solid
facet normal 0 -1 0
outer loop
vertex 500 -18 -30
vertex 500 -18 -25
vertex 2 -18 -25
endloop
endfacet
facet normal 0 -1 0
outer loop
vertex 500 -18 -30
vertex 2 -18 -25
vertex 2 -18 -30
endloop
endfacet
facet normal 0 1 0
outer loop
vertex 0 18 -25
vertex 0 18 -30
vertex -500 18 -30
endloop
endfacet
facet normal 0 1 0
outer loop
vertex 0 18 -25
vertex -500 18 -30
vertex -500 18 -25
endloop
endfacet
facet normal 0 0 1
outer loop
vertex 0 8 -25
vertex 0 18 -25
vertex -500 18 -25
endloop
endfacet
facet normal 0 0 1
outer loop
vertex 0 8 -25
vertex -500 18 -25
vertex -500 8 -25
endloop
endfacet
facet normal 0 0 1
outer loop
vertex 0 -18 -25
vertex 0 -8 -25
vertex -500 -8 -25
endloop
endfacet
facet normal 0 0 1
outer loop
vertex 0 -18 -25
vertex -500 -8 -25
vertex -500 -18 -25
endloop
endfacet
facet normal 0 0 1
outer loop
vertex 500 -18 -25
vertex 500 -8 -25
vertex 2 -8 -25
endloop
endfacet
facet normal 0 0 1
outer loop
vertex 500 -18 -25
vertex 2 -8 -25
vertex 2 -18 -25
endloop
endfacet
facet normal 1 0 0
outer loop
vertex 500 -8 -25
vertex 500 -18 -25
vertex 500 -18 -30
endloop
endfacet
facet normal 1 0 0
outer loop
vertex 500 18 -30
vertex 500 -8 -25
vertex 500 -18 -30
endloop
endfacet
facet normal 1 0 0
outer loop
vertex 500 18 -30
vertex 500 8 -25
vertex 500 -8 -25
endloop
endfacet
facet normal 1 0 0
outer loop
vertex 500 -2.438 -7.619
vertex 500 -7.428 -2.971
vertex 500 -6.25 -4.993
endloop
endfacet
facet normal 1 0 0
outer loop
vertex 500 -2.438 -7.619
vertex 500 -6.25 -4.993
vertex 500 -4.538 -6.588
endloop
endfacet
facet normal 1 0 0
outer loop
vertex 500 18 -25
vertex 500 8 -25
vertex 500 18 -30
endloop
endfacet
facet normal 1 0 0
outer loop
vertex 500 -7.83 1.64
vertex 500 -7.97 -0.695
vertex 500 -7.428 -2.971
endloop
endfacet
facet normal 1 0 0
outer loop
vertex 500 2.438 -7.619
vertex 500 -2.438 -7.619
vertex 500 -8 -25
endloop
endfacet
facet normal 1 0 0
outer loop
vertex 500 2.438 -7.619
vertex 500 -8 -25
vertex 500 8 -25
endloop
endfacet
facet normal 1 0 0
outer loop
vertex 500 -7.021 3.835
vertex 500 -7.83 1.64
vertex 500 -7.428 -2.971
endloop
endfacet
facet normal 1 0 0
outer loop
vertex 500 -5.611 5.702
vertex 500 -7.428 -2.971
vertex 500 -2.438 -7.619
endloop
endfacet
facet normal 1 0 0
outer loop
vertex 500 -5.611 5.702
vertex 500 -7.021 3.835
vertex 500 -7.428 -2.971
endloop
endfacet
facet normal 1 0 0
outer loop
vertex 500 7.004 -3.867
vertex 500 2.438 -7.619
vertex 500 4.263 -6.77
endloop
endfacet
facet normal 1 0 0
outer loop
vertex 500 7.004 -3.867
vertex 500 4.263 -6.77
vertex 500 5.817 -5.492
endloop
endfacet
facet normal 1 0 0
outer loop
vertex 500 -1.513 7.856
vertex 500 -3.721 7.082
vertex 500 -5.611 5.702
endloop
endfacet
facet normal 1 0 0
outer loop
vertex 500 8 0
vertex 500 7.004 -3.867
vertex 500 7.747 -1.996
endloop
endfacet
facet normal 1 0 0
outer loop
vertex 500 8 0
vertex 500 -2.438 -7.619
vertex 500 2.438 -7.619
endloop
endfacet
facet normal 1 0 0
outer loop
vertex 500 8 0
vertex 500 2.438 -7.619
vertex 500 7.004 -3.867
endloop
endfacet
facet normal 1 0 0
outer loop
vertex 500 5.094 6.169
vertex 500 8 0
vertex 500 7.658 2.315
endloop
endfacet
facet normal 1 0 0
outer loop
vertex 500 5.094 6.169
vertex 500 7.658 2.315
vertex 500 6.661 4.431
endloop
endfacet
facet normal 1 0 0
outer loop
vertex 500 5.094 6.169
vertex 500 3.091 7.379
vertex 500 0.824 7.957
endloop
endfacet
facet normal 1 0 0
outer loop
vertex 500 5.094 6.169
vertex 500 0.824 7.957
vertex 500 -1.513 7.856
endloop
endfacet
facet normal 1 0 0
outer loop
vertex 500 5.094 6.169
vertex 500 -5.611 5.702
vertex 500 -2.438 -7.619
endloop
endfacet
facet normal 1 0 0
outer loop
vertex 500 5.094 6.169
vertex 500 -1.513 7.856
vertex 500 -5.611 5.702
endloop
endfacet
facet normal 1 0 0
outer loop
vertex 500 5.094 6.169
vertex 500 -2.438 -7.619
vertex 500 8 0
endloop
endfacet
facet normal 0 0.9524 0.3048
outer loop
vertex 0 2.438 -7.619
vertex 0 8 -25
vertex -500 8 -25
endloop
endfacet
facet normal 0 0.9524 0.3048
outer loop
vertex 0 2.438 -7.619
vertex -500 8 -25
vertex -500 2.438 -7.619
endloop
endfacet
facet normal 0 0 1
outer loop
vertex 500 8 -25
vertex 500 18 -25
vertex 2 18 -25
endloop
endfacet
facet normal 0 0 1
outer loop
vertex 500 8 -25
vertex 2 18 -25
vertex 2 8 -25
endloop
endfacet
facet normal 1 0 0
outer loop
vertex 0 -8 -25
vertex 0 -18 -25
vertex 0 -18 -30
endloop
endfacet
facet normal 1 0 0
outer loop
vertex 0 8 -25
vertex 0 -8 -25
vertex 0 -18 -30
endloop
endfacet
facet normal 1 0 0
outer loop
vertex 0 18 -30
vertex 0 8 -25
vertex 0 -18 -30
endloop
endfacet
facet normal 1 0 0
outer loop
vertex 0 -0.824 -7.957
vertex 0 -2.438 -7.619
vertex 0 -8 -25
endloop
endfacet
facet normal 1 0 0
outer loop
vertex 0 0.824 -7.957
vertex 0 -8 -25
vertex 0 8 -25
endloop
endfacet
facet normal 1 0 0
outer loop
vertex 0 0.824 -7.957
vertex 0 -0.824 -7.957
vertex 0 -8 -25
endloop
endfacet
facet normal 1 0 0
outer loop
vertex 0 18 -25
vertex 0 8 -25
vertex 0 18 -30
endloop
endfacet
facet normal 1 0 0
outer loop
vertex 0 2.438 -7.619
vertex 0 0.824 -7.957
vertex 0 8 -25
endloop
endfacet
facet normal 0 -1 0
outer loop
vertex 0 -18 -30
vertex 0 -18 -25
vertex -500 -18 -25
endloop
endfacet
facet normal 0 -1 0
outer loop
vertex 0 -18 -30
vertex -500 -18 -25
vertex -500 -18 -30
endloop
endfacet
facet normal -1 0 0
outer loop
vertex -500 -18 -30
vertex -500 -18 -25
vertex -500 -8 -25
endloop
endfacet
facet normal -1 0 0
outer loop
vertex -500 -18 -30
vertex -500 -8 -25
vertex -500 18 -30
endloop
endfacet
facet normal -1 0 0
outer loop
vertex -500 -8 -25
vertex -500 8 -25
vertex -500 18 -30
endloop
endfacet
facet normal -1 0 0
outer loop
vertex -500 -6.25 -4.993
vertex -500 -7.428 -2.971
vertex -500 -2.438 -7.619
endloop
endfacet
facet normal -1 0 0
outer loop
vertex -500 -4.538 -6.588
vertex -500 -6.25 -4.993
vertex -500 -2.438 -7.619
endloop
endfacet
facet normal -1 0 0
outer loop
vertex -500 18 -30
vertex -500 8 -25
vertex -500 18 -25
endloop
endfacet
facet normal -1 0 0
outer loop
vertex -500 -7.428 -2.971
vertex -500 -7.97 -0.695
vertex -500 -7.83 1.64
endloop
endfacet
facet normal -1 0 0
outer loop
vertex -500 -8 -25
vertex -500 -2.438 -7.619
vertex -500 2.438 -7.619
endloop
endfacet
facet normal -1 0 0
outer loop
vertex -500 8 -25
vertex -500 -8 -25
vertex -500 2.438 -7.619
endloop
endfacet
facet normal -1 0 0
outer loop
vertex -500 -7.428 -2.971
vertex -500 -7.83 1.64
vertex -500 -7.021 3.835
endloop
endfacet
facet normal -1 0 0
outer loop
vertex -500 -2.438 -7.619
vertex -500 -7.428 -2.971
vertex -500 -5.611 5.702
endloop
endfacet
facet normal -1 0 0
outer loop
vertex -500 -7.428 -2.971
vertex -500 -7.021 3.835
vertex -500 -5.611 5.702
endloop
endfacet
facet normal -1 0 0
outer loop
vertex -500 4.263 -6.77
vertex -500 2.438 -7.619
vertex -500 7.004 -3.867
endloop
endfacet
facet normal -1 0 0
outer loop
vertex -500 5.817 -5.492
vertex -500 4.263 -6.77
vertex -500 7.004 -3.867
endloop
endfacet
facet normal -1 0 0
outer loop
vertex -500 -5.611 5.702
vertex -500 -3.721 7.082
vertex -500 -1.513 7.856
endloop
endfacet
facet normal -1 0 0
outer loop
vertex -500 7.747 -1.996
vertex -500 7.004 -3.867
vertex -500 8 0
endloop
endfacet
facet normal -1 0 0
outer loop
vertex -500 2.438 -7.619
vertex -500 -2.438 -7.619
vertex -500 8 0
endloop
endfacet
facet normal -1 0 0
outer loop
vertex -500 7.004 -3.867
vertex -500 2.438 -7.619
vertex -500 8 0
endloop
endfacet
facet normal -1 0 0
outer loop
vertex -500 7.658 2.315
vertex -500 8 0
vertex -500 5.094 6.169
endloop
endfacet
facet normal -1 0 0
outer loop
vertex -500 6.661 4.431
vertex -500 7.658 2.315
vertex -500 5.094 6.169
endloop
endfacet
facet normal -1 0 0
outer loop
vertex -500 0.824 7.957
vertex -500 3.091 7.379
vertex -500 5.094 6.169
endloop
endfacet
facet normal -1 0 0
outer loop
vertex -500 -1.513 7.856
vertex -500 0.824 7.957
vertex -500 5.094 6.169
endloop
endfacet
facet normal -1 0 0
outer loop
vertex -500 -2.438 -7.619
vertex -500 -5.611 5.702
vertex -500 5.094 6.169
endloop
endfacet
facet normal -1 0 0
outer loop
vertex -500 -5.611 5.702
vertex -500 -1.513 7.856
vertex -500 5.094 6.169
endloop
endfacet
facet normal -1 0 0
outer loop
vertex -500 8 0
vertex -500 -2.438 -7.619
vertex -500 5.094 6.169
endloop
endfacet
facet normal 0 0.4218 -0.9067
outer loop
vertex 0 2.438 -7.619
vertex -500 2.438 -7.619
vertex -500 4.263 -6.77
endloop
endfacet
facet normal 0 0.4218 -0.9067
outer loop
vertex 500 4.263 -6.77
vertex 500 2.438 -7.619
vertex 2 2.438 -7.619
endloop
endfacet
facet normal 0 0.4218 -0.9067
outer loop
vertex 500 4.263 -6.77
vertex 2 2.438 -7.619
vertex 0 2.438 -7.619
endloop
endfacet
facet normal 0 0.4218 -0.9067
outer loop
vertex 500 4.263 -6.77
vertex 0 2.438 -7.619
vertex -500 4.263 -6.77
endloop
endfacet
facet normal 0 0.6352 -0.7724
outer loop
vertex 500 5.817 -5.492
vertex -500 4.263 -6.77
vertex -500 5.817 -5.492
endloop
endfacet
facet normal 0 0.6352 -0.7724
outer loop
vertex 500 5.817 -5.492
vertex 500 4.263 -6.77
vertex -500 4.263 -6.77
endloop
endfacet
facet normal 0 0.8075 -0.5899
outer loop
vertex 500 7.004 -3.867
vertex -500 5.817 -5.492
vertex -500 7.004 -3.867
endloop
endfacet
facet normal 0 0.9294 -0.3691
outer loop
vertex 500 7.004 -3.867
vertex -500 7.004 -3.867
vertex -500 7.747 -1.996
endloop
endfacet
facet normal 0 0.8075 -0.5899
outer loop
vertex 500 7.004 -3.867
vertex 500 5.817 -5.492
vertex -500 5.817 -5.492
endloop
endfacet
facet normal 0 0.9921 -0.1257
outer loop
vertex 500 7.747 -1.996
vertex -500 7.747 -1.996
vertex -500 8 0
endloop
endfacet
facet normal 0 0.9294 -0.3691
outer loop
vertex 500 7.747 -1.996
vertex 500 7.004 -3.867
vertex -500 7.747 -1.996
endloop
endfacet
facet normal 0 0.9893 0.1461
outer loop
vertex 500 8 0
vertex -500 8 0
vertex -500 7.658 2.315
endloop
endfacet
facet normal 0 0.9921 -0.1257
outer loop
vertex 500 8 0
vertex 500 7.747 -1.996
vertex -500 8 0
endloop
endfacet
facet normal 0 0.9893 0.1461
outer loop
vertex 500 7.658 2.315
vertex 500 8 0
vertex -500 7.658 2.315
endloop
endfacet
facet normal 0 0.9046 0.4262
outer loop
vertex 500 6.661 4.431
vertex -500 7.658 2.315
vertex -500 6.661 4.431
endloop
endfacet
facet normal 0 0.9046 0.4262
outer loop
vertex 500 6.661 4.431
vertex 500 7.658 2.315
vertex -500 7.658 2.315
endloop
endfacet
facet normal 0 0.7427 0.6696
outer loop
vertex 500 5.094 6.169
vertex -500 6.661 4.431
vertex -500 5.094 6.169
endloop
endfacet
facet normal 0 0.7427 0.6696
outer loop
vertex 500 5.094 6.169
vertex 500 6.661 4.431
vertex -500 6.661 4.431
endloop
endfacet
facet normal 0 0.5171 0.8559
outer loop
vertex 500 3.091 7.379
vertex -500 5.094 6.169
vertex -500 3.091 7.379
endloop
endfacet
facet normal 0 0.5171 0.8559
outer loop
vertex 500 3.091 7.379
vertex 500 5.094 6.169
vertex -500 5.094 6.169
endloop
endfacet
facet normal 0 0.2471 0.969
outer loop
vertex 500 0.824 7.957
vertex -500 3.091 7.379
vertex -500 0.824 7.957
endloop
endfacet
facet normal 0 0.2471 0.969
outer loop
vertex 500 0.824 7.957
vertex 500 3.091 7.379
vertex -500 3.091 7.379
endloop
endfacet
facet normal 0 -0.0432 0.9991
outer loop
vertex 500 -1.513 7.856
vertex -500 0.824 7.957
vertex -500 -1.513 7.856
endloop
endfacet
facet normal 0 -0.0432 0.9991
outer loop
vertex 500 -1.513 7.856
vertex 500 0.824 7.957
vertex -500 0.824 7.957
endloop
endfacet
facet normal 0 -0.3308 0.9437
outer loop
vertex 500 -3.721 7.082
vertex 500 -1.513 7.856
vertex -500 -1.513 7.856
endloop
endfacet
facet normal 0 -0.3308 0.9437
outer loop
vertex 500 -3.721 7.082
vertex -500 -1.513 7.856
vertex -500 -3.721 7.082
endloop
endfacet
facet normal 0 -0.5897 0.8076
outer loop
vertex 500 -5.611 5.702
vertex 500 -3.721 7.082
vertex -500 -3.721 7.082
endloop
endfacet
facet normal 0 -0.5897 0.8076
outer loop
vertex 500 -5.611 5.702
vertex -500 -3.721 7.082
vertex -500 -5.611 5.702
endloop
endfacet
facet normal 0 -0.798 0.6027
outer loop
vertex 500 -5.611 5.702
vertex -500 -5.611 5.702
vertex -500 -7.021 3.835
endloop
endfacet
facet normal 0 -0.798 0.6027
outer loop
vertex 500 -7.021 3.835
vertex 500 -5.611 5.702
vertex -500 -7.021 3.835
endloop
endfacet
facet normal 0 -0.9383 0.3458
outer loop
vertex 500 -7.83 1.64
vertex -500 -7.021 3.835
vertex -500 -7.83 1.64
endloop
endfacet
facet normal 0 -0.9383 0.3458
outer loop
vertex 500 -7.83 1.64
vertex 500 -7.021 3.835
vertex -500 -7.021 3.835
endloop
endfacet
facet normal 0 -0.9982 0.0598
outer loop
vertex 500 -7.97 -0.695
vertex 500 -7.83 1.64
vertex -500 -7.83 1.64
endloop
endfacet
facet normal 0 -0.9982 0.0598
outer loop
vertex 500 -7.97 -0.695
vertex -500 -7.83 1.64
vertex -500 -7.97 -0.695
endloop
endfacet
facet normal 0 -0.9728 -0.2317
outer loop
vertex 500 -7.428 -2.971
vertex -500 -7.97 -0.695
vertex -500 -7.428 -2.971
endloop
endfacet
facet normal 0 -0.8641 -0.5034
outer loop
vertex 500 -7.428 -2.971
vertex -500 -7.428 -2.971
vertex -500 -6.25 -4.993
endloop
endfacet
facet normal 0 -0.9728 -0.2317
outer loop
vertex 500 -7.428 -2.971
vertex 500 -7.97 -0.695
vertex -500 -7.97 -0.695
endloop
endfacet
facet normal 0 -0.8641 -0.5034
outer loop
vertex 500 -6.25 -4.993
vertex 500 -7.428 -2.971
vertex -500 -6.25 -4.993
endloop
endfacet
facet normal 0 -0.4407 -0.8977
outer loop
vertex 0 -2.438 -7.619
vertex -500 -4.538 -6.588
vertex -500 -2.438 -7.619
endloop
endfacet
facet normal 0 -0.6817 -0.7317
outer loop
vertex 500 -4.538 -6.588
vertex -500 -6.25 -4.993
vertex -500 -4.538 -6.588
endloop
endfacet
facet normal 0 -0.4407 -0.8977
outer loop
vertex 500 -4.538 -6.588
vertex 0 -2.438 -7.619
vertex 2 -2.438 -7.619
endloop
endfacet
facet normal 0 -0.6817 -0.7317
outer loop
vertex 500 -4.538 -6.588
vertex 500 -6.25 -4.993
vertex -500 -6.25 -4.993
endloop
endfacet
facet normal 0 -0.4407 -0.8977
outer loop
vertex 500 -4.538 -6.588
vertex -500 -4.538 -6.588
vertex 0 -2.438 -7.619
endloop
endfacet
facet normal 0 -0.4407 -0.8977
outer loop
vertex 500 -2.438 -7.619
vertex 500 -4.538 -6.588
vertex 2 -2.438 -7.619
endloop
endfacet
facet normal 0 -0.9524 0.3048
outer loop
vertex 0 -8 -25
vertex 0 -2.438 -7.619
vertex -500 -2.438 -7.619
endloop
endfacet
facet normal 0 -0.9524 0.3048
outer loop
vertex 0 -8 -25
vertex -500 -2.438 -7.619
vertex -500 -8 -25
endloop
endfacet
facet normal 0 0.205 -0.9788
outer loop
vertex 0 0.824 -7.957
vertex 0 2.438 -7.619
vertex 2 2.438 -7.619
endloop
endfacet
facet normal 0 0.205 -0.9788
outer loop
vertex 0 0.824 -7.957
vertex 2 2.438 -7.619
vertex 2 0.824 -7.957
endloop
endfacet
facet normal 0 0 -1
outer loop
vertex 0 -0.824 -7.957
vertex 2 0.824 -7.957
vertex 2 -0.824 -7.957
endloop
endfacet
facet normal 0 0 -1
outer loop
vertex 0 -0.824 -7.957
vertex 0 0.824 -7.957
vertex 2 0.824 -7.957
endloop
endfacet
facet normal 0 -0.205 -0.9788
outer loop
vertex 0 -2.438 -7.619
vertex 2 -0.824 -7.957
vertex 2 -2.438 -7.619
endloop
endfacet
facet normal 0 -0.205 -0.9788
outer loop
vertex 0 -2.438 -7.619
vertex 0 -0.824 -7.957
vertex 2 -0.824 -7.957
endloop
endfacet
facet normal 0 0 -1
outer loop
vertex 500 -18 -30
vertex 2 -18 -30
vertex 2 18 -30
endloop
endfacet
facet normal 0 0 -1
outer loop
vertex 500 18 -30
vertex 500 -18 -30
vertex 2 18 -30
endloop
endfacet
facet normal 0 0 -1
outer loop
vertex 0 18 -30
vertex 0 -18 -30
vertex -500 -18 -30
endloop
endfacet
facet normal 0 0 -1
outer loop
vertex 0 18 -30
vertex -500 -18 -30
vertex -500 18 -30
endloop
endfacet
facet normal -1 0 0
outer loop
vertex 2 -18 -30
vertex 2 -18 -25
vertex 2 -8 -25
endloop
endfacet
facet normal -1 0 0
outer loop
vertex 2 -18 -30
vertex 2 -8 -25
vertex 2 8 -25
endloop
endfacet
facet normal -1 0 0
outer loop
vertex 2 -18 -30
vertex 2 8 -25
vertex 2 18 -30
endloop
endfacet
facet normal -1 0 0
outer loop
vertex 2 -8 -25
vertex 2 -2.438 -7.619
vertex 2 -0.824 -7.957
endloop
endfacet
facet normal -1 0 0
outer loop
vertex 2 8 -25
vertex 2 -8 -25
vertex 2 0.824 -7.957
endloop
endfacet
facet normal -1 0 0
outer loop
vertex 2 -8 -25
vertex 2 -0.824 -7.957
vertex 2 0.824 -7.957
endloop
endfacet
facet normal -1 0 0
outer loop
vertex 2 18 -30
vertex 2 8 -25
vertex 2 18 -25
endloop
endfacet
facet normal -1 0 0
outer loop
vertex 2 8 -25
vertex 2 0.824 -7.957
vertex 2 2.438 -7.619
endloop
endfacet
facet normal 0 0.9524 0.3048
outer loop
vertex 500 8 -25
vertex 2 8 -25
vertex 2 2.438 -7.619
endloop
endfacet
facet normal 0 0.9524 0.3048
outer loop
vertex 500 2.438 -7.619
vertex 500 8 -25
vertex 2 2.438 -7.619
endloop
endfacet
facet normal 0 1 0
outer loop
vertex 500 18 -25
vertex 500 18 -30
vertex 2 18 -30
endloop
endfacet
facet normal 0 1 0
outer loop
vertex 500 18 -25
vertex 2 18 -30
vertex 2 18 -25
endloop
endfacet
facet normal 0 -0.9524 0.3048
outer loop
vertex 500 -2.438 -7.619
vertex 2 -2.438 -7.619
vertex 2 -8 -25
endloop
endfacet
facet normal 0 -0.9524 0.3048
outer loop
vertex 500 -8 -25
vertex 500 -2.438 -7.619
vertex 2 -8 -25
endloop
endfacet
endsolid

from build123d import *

# Parameters (mm, degrees)
F1_DEPTH = 500
F2_DEPTH = 2


with BuildPart() as f1:
    # F0 (on Right) → F1 (new body, symmetric)
    with BuildSketch(Plane.YZ):
        with BuildLine():
            ThreePointArc((2.4382058168, -7.6193931776), (6.461642459, -4.7166912908), (8, 0))
            ThreePointArc((8, 0), (-4.7166912908, 6.461642459), (-2.4382058168, -7.6193931776))
            Line((-2.4382058168, -7.6193931776), (0, 0))
            Line((0, 0), (2.4382058168, -7.6193931776))
        make_face()
        with BuildLine():
            Line((0, 0), (-2.4382058168, -7.6193931776))
            ThreePointArc((-2.4382058168, -7.6193931776), (0, -8), (2.4382058168, -7.6193931776))
            Line((2.4382058168, -7.6193931776), (0, 0))
        make_face()
        with BuildLine():
            ThreePointArc((2.4382058168, -7.6193931776), (0, -8), (-2.4382058168, -7.6193931776))
            Line((-2.4382058168, -7.6193931776), (-8, -25))
            Line((-8, -25), (0, -25))
            Line((0, -25), (8, -25))
            Line((8, -25), (2.4382058168, -7.6193931776))
        make_face()
        Polygon((0, -25), (-8, -25), (-18, -25), (-18, -30), (18, -30), (18, -25), (8, -25), align=None)
    extrude(amount=F1_DEPTH, both=True)

    # F0 (on Right) → F2 (cut)
    with BuildSketch(Plane.YZ):
        with BuildLine():
            ThreePointArc((2.4382058168, -7.6193931776), (0, -8), (-2.4382058168, -7.6193931776))
            Line((-2.4382058168, -7.6193931776), (-8, -25))
            Line((-8, -25), (0, -25))
            Line((0, -25), (8, -25))
            Line((8, -25), (2.4382058168, -7.6193931776))
        make_face()
        Polygon((0, -25), (-8, -25), (-18, -25), (-18, -30), (18, -30), (18, -25), (8, -25), align=None)
    extrude(amount=F2_DEPTH, mode=Mode.SUBTRACT)


solid = f1.part
